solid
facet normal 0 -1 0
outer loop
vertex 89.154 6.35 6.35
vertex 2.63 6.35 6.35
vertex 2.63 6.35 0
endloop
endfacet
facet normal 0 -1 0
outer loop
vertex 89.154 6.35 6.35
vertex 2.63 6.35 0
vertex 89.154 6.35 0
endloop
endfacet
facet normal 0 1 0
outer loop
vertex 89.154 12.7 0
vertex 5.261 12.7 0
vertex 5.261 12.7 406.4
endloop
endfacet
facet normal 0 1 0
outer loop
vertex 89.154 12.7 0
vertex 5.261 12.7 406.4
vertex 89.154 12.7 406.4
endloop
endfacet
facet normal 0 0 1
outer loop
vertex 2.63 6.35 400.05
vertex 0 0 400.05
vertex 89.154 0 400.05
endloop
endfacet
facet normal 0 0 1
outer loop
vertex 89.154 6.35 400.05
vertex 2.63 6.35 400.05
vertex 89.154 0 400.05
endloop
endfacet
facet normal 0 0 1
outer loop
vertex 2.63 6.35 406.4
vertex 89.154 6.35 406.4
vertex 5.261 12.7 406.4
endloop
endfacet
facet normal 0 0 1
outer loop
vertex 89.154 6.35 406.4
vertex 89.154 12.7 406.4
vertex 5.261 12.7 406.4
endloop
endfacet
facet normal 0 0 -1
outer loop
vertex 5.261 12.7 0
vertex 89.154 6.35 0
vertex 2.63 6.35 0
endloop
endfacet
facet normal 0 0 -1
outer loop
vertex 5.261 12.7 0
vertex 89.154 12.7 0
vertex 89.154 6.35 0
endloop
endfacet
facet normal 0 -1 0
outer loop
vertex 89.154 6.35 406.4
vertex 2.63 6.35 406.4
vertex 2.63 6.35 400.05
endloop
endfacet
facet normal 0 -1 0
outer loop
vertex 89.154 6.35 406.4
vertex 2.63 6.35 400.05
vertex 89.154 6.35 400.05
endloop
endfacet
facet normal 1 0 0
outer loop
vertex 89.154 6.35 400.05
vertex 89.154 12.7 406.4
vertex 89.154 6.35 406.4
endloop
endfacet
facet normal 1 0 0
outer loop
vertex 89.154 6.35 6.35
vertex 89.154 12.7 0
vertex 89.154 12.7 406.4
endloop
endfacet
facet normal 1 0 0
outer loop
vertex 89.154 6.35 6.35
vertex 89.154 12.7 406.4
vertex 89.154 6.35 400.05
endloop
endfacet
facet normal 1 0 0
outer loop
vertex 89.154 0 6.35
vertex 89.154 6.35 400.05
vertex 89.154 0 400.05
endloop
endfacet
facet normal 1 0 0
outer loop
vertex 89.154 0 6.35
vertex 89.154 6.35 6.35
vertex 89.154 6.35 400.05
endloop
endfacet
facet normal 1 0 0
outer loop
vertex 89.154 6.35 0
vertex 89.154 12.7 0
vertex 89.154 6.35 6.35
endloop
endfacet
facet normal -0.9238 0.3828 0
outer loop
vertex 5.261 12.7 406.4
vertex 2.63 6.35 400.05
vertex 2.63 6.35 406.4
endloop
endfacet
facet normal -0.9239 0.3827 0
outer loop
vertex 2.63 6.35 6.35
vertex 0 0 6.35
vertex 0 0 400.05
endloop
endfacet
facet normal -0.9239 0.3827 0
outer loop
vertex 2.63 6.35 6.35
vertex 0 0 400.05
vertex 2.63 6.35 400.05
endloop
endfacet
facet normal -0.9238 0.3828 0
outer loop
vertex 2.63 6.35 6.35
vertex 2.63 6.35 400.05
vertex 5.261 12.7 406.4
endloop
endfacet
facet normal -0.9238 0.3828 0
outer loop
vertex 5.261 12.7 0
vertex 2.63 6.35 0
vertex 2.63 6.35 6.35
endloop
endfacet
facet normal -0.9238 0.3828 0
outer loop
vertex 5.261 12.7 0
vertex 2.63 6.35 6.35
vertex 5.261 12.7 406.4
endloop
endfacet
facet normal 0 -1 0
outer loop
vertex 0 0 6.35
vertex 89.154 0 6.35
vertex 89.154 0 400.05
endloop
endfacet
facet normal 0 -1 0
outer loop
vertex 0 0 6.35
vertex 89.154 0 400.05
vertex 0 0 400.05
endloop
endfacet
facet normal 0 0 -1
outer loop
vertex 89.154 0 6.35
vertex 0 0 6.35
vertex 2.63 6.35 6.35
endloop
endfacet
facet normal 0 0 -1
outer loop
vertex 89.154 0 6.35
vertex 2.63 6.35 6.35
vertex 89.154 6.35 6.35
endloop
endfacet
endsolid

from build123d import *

# Parameters (mm, degrees)
BOSS_EXTRUDE1_DEPTH = 406.4
SKETCH2_W           = 89.154
SKETCH2_H           = 6.35
CUT_EXTRUDE1_DEPTH  = 6.35


with BuildPart() as part:
    # Sketch1 → Boss-Extrude1 (new body)
    with BuildSketch(Plane.XY):
        Polygon((0, 0), (5.260512242, 12.7), (89.154, 12.7), (89.154, 0), align=None)
    extrude(amount=BOSS_EXTRUDE1_DEPTH)

    # Sketch2 → Cut-Extrude1 (cut)
    with BuildSketch(Plane.XZ):
        with Locations((44.577, 3.175)):
            Rectangle(SKETCH2_W, SKETCH2_H)
        with Locations((44.577, 403.225)):
            Rectangle(SKETCH2_W, SKETCH2_H)
    extrude(amount=-CUT_EXTRUDE1_DEPTH, mode=Mode.SUBTRACT)


solid = part.part
